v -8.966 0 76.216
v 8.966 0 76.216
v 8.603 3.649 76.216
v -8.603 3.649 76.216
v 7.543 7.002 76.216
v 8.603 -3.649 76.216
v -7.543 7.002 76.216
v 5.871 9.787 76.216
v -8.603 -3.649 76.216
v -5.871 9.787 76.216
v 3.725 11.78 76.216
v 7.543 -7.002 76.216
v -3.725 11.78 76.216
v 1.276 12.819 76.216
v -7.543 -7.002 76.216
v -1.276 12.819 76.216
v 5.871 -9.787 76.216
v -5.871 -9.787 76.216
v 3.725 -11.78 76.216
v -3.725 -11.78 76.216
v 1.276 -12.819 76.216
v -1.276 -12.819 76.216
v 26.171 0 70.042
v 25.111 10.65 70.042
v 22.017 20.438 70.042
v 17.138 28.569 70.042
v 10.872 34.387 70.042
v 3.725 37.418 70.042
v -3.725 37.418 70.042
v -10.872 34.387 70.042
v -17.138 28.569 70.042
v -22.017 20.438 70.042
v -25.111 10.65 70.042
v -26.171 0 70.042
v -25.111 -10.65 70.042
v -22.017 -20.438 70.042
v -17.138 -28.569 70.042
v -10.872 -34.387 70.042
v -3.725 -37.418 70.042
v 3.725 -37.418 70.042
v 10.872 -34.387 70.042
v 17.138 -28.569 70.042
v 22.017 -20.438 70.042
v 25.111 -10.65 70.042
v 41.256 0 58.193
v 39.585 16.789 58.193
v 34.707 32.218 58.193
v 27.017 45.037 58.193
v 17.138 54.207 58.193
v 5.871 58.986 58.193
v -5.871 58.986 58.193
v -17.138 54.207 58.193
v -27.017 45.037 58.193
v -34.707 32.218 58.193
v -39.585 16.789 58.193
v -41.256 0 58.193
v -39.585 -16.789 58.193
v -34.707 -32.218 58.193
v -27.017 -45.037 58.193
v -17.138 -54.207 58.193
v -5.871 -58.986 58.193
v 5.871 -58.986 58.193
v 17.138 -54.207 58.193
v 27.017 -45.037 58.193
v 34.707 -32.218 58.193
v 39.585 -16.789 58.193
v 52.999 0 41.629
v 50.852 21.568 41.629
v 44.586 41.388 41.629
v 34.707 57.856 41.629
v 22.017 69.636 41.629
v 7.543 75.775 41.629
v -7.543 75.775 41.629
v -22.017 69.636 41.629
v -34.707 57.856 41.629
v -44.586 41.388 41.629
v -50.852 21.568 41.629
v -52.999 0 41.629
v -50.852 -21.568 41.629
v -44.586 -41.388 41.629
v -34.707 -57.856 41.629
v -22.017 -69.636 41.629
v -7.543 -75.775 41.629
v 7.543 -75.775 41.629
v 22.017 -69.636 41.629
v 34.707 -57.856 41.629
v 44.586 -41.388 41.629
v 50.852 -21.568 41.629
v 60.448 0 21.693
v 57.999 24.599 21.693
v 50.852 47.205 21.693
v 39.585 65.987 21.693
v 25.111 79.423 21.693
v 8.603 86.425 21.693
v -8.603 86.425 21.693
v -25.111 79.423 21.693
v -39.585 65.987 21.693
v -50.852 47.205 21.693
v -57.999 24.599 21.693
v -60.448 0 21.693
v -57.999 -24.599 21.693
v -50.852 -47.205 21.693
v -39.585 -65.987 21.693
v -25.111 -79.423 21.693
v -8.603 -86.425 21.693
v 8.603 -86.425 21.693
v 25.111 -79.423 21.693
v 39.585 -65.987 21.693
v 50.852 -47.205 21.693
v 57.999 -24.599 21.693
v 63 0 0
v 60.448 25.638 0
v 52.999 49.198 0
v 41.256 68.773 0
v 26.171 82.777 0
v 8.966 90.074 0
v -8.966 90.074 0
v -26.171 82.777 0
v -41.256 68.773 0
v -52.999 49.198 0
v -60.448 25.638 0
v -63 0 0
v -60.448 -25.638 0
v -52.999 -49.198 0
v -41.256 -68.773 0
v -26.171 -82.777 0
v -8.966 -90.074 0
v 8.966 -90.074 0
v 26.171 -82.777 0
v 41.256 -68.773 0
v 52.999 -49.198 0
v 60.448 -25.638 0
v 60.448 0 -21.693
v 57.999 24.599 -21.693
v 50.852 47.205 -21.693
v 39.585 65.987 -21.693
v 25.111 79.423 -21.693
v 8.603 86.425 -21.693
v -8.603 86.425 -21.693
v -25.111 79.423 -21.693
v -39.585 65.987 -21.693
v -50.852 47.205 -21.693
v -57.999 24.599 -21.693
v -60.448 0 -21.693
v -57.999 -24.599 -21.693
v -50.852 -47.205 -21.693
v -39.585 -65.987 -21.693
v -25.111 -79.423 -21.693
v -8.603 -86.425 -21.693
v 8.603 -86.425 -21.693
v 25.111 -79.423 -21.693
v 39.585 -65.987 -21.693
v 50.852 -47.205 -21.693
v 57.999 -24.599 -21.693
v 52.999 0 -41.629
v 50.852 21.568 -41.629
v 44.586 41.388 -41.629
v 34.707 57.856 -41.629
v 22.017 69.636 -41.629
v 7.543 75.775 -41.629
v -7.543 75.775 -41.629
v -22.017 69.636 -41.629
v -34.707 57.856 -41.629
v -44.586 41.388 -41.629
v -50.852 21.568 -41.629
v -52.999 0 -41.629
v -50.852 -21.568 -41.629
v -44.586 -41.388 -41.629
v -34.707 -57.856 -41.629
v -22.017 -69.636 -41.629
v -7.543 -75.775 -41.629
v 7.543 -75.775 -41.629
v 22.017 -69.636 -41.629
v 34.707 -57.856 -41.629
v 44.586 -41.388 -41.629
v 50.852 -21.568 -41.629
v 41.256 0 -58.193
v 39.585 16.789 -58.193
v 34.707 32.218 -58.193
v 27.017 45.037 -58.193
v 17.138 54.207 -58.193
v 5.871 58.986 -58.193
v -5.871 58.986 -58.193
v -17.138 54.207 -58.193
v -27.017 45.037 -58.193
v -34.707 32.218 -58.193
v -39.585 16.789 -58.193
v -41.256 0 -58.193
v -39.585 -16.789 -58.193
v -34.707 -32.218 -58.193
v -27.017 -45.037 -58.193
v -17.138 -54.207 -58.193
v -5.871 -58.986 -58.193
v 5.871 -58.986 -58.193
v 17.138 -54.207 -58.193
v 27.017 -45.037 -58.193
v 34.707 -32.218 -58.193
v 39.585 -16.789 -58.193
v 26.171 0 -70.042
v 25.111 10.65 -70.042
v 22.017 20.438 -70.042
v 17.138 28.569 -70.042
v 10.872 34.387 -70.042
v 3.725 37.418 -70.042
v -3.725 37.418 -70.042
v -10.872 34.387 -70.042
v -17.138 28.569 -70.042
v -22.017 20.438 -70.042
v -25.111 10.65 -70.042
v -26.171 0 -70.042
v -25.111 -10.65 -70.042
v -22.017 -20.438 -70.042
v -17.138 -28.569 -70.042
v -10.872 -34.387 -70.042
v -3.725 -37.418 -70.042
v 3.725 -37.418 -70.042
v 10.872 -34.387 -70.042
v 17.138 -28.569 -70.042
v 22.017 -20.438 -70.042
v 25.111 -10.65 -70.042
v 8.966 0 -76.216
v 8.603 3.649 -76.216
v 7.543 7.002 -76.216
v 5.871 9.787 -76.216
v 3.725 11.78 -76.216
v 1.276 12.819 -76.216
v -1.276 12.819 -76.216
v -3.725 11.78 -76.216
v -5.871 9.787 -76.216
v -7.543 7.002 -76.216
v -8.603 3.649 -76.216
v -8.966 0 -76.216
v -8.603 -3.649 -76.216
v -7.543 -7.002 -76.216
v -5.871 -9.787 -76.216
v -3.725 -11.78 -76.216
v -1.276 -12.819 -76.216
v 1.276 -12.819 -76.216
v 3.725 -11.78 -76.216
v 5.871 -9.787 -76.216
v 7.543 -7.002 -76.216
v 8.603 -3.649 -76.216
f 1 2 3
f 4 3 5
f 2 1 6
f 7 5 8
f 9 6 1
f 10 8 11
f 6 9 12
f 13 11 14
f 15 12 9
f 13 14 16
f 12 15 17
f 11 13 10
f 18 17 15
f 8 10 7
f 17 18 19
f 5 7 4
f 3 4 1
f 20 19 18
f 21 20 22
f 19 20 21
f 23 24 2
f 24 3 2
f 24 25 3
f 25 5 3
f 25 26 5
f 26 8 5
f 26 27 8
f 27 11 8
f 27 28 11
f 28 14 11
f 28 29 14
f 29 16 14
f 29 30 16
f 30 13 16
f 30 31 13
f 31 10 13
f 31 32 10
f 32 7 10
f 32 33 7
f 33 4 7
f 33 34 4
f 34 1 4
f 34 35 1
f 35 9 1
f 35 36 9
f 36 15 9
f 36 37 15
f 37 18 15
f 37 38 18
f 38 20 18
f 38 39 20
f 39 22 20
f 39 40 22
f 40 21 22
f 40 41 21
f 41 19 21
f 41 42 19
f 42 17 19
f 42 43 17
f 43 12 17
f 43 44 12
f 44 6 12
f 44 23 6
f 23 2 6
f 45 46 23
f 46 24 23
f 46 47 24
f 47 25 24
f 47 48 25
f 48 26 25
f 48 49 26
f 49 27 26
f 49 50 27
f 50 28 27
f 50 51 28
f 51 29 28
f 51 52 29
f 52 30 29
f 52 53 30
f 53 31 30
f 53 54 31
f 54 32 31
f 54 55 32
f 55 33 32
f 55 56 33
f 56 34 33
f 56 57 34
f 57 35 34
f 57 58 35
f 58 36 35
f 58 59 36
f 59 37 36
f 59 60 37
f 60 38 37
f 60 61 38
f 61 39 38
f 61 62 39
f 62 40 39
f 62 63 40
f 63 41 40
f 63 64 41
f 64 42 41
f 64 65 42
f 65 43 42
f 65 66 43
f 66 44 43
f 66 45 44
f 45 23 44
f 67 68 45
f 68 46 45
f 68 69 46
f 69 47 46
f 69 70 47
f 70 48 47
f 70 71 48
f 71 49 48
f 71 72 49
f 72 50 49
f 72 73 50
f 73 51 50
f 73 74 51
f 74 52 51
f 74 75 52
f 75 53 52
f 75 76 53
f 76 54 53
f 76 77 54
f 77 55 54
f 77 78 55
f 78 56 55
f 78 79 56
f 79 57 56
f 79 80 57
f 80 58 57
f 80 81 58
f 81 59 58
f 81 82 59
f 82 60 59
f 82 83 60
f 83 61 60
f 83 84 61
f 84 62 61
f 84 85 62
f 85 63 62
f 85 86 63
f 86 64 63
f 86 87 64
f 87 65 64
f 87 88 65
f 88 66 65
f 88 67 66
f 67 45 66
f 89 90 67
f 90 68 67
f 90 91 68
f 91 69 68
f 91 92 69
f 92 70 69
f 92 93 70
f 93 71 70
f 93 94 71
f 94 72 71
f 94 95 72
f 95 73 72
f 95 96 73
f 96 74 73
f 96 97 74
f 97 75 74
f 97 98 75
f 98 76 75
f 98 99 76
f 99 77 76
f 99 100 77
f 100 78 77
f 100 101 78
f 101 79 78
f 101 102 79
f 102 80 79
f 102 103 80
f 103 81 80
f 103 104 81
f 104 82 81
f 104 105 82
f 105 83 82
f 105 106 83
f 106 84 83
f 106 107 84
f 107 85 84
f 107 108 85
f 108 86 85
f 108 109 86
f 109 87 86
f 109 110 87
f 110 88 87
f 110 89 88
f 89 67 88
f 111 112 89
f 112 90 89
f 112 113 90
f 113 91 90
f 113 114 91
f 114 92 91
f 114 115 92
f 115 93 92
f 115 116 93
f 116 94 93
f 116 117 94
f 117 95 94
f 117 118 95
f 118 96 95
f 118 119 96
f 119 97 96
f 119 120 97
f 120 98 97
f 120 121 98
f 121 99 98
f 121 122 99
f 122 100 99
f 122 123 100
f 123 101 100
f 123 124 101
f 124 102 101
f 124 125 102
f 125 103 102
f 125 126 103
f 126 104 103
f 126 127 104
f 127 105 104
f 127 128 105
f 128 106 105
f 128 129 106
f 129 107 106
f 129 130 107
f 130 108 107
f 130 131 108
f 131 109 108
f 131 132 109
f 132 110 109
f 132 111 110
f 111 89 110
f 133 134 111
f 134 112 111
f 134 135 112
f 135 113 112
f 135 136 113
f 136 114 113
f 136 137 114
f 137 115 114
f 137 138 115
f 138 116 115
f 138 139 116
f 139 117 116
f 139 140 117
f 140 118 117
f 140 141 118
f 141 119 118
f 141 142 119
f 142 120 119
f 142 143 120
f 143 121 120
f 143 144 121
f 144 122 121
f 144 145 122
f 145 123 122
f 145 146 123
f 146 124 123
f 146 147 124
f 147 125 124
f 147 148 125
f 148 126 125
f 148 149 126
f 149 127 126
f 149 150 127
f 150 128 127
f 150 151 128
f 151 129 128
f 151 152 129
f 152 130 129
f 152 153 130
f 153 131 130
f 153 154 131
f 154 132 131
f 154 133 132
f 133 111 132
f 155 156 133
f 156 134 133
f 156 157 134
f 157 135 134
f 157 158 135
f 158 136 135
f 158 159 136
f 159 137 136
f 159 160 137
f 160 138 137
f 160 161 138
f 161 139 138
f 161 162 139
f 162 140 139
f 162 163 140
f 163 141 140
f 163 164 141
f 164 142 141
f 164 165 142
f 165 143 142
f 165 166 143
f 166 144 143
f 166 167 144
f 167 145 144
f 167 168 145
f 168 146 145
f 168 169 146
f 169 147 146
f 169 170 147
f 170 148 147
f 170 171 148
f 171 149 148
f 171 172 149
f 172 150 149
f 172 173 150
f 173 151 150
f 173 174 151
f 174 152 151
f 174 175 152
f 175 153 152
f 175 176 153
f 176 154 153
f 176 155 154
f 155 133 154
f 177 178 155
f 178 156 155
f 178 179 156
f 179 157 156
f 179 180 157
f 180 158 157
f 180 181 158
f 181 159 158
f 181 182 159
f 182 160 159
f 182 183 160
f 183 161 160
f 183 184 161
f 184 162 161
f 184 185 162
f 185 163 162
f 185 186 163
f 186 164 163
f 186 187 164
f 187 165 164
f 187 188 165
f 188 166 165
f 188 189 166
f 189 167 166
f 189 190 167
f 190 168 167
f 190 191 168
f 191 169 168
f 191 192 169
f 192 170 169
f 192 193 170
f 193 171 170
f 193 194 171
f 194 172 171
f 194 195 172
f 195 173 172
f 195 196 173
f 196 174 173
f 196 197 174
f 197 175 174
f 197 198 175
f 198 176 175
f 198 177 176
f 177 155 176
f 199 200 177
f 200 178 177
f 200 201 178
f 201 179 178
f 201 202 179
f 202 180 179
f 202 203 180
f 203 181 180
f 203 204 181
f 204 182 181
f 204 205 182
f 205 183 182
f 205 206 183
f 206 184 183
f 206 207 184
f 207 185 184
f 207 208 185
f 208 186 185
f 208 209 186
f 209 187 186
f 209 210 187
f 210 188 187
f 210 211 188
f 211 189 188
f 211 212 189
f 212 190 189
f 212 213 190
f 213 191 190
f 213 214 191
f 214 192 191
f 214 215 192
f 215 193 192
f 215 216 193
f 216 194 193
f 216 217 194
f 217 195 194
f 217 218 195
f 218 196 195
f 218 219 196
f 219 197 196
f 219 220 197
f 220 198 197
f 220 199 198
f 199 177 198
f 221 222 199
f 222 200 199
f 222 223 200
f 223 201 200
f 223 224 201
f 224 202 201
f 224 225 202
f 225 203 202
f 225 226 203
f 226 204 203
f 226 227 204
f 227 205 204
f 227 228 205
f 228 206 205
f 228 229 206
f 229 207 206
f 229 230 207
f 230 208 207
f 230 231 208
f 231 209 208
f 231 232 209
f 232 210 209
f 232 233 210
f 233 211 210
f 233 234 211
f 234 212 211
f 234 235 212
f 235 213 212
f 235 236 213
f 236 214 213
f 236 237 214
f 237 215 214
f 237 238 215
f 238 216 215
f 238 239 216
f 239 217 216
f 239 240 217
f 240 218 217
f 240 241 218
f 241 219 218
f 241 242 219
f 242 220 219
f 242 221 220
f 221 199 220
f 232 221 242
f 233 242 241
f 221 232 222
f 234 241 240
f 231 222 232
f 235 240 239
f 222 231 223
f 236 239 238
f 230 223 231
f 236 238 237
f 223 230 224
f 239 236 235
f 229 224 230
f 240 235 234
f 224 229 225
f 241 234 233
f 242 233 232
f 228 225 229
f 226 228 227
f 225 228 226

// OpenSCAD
// Generated by SolidPython 1.0.1 on 2020-07-29 00:46:48


scale(v = [9, 13, 11]) {
	sphere(r = 7);
}
/***********************************************
*********      SolidPython code:      **********
************************************************
 
# import packages: SolidPython
from solid import *
from solid.utils import *
from itertools import chain, combinations, permutations


class Resize:

    def __init__(self, scad_file):
        self.scad_file = scad_file
        #self.scad_file = import_scad(scad_file)
        # cone/cylinder param:
        self.r1 = 0
        self.r2 = 0
        self.h = 0
        # rectangular prism param:
        self.w = 0
        self.l = 0
        # ellipse param:
        self.r = 0

    # import OpenScad code (file name corresponds to shape)


    # classify shape + parameters
    def assign(self, param1, param2, param3):
        if self.scad_file == 'cone.scad':
            self.r1 = param1
            self.r2 = param2
            self.h = param3
        elif self.scad_file == 'cylinder.scad':
            self.r1 = param1
            self.r2 = param2
            self.h = param3
        elif self.scad_file == 'rectangularPrism.scad':
            self.h = param1
            self.l = param2
            self.w = param3
        else:
            self.r = param1
            self.h = param2

    # resize parameters
    def iterate(self):
        x = range(3, 20, 2)
        i = 1
        if self.scad_file == 'cone.scad':
            tempList = list(permutations(x, 2))
            for temp in tempList:
                param1 = temp[0]
                param2 = temp[1]
                filepath = 'produced_scad_files/' + 'cone' + str(param1) + '_' + str(param2) + '_' + '.scad'
                scad_render_to_file(cylinder(h=param1, r1=param2, r2=0), filepath)

        elif self.scad_file == 'cylinder.scad':
            tempList = list(permutations(x, 3))
            for temp in tempList:
                param1 = temp[0]
                param2 = temp[1]
                filepath = 'produced_scad_files/' + 'cylinder' + str(param1) + '_' + str(param2) + '_' + '.scad'
                scad_render_to_file(cylinder(h=param1, r1=param2, r2=param2), filepath)

        elif self.scad_file == 'rectangularPrism.scad':
            tempList = list(permutations(x, 3))
            for temp in tempList:
                param1 = temp[0]
                param2 = temp[1]
                param3 = temp[2]
                filepath = 'produced_scad_files/' + 'rectangularPrism' + str(param1) + '_' + str(param2) + '_' + str(
                    param3) + '.scad'
                scad_render_to_file(cube(size=(param1, param2, param3)), filepath)

        elif self.scad_file == 'ellipse.scad':
            tempList = list(permutations(x, 4))
            for temp in tempList:
                param1 = temp[0]
                param2 = temp[1]
                param3 = temp[2]
                param4 = temp[3]
                filepath = 'produced_scad_files/' + 'ellipse' + str(param1) + '_' + str(param2) + '_' + str(param3) + '_' + str(param4) + '.scad'
                scad_render_to_file(scale([param1, param2, param3])(sphere(r=param4)), filepath)

    def render_to_scadfile(self):
        scad_render_to_file(scad, 'example.scad') 
 
************************************************/
